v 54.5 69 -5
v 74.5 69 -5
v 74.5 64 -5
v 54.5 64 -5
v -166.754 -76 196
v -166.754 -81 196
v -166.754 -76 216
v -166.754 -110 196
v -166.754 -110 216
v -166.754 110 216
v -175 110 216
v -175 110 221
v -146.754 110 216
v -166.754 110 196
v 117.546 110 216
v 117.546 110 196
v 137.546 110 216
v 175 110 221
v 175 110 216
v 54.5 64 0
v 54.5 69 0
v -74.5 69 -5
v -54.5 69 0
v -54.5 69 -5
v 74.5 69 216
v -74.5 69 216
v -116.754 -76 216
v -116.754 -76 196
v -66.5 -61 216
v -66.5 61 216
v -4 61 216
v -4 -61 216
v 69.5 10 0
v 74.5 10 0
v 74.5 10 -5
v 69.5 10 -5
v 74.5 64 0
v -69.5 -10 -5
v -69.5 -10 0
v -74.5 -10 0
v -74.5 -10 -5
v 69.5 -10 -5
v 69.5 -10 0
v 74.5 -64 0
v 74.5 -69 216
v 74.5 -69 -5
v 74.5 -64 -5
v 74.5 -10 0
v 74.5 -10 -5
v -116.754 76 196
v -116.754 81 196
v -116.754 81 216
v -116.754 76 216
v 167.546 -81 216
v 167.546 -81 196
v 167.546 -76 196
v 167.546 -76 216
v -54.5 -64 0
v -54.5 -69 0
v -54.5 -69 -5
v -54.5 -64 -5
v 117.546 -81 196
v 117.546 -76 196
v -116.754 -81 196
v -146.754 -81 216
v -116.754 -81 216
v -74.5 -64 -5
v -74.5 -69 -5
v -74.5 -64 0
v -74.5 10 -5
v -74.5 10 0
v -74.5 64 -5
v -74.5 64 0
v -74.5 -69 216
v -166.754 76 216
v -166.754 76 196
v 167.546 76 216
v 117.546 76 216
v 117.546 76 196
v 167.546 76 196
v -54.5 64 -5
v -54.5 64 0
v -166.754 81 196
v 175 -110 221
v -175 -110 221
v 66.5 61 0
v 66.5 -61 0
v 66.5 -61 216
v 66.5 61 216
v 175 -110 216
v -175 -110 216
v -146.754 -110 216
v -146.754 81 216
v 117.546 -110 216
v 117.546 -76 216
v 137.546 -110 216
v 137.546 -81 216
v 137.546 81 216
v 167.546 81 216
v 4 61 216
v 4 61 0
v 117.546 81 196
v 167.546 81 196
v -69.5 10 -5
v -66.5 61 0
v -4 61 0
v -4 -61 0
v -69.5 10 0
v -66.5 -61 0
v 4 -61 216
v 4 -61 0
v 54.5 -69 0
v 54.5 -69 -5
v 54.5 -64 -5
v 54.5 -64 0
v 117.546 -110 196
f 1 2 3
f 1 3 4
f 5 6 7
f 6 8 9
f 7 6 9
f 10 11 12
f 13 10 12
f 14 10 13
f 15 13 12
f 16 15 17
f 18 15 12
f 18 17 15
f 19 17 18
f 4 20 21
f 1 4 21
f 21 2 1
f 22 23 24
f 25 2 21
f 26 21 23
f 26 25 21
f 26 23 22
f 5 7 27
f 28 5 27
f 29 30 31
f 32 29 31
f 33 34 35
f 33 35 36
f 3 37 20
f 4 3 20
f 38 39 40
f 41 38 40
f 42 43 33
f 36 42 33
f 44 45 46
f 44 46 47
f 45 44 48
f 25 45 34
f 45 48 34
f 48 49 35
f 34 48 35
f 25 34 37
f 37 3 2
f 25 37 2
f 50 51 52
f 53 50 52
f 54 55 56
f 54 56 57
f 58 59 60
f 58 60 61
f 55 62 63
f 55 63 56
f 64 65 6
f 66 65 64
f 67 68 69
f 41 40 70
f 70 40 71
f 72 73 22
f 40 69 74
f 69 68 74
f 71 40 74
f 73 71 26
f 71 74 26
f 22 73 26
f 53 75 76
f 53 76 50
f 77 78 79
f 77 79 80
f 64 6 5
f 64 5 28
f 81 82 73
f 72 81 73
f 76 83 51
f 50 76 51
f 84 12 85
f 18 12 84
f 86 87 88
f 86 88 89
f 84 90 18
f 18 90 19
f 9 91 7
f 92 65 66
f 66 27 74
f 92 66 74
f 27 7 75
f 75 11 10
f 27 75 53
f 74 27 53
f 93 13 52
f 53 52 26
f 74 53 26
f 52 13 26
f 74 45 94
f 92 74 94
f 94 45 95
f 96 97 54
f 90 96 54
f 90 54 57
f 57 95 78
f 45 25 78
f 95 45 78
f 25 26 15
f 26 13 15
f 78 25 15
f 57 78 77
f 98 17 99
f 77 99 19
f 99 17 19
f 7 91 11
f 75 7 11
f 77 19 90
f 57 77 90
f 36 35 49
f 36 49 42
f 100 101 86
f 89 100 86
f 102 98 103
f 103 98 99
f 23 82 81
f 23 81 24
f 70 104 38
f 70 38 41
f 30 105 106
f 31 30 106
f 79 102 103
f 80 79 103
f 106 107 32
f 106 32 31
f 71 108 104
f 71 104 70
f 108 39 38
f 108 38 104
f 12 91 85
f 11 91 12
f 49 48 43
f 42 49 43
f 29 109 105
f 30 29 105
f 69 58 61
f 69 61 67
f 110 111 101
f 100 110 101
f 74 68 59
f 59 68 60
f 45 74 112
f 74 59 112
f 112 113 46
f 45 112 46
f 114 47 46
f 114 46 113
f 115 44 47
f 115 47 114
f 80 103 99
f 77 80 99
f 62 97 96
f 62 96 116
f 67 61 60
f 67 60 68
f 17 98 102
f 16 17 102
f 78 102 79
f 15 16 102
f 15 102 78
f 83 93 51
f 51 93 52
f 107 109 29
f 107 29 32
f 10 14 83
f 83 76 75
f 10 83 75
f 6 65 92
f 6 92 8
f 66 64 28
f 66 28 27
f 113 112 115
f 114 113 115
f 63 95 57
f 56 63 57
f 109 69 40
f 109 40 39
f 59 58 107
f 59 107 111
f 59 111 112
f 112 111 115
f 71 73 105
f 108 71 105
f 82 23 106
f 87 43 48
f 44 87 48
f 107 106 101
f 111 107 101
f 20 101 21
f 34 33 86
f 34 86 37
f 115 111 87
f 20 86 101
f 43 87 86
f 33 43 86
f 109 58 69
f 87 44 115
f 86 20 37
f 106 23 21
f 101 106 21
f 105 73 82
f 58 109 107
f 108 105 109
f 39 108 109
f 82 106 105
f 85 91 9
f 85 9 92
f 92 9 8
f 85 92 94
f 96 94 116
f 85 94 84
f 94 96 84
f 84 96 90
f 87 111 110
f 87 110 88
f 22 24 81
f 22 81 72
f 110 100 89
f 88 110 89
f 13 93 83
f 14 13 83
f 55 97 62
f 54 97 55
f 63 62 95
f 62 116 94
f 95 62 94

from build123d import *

# Parameters (mm, degrees)
SKETCH_1_W      = 149
SKETCH_1_H      = 138
SKETCH_1_W_2    = 62.5
SKETCH_1_H_2    = 122
EXTRUDE_1_DEPTH = 216
SKETCH_2_W      = 5
SKETCH_2_H      = 20
SKETCH_2_W_2    = 20
SKETCH_2_H_2    = 5
EXTRUDE_2_DEPTH = 5
SKETCH_3_W      = 350
SKETCH_3_H      = 220
EXTRUDE_3_DEPTH = 5
EXTRUDE_START   = 12
EXTRUDE_4_DEPTH = 29
SKETCH_6_W      = 50
SKETCH_6_H      = 20
EXTRUDE_5_DEPTH = 5


with BuildPart() as part:
    # 草图1 → 凸台-拉伸1 (new body)
    with BuildSketch(Plane.XY):
        Rectangle(SKETCH_1_W, SKETCH_1_H)
        with Locations((35.25, 0)):
            Rectangle(SKETCH_1_W_2, SKETCH_1_H_2, mode=Mode.SUBTRACT)
        with Locations((-35.25, 0)):
            Rectangle(SKETCH_1_W_2, SKETCH_1_H_2, mode=Mode.SUBTRACT)
    extrude(amount=EXTRUDE_1_DEPTH)

    # 草图2 → 凸台-拉伸2 (add)
    with BuildSketch(Plane(origin=(0, 0, 0), x_dir=(-1, 0, 0), z_dir=(0, 0, -1))):
        with Locations((72, 0)):
            Rectangle(SKETCH_2_W, SKETCH_2_H)
        with Locations((-72, 0)):
            Rectangle(SKETCH_2_W, SKETCH_2_H)
        with Locations((64.5, 66.5)):
            Rectangle(SKETCH_2_W_2, SKETCH_2_H_2)
        with Locations((-64.5, 66.5)):
            Rectangle(SKETCH_2_W_2, SKETCH_2_H_2)
        with Locations((64.5, -66.5)):
            Rectangle(SKETCH_2_W_2, SKETCH_2_H_2)
        with Locations((-64.5, -66.5)):
            Rectangle(SKETCH_2_W_2, SKETCH_2_H_2)
    extrude(amount=EXTRUDE_2_DEPTH)

    # 草图3 → 凸台-拉伸3 (add)
    with BuildSketch(Plane.XY.offset(216)):
        Rectangle(SKETCH_3_W, SKETCH_3_H)
    extrude(amount=EXTRUDE_3_DEPTH)

    # 草图5 → 凸台-拉伸4 (add)
    with BuildSketch(Plane(origin=(0, 69, 0), x_dir=(1, 0, 0), z_dir=(0, 1, 0)).offset(EXTRUDE_START)):
        Polygon((-146.754147686, -216), (-166.754147686, -196), (-166.754147686, -216), align=None)
        Polygon((117.545852314, -216), (137.545852314, -216), (117.545852314, -196), align=None)
    extrude_4 = extrude(amount=EXTRUDE_4_DEPTH)

    # 草图6 → 凸台-拉伸5 (add)
    with BuildSketch(Plane.XZ.offset(-81)):
        with Locations((142.545852314, 206)):
            Rectangle(SKETCH_6_W, SKETCH_6_H)
        with Locations((-141.754147686, 206)):
            Rectangle(SKETCH_6_W, SKETCH_6_H)
    extrude_5 = extrude(amount=EXTRUDE_5_DEPTH)

    # 镜向1: 凸台-拉伸4, 凸台-拉伸5 across plane
    add(extrude_4.mirror(Plane.ZX))
    add(extrude_5.mirror(Plane.ZX))


solid = part.part
